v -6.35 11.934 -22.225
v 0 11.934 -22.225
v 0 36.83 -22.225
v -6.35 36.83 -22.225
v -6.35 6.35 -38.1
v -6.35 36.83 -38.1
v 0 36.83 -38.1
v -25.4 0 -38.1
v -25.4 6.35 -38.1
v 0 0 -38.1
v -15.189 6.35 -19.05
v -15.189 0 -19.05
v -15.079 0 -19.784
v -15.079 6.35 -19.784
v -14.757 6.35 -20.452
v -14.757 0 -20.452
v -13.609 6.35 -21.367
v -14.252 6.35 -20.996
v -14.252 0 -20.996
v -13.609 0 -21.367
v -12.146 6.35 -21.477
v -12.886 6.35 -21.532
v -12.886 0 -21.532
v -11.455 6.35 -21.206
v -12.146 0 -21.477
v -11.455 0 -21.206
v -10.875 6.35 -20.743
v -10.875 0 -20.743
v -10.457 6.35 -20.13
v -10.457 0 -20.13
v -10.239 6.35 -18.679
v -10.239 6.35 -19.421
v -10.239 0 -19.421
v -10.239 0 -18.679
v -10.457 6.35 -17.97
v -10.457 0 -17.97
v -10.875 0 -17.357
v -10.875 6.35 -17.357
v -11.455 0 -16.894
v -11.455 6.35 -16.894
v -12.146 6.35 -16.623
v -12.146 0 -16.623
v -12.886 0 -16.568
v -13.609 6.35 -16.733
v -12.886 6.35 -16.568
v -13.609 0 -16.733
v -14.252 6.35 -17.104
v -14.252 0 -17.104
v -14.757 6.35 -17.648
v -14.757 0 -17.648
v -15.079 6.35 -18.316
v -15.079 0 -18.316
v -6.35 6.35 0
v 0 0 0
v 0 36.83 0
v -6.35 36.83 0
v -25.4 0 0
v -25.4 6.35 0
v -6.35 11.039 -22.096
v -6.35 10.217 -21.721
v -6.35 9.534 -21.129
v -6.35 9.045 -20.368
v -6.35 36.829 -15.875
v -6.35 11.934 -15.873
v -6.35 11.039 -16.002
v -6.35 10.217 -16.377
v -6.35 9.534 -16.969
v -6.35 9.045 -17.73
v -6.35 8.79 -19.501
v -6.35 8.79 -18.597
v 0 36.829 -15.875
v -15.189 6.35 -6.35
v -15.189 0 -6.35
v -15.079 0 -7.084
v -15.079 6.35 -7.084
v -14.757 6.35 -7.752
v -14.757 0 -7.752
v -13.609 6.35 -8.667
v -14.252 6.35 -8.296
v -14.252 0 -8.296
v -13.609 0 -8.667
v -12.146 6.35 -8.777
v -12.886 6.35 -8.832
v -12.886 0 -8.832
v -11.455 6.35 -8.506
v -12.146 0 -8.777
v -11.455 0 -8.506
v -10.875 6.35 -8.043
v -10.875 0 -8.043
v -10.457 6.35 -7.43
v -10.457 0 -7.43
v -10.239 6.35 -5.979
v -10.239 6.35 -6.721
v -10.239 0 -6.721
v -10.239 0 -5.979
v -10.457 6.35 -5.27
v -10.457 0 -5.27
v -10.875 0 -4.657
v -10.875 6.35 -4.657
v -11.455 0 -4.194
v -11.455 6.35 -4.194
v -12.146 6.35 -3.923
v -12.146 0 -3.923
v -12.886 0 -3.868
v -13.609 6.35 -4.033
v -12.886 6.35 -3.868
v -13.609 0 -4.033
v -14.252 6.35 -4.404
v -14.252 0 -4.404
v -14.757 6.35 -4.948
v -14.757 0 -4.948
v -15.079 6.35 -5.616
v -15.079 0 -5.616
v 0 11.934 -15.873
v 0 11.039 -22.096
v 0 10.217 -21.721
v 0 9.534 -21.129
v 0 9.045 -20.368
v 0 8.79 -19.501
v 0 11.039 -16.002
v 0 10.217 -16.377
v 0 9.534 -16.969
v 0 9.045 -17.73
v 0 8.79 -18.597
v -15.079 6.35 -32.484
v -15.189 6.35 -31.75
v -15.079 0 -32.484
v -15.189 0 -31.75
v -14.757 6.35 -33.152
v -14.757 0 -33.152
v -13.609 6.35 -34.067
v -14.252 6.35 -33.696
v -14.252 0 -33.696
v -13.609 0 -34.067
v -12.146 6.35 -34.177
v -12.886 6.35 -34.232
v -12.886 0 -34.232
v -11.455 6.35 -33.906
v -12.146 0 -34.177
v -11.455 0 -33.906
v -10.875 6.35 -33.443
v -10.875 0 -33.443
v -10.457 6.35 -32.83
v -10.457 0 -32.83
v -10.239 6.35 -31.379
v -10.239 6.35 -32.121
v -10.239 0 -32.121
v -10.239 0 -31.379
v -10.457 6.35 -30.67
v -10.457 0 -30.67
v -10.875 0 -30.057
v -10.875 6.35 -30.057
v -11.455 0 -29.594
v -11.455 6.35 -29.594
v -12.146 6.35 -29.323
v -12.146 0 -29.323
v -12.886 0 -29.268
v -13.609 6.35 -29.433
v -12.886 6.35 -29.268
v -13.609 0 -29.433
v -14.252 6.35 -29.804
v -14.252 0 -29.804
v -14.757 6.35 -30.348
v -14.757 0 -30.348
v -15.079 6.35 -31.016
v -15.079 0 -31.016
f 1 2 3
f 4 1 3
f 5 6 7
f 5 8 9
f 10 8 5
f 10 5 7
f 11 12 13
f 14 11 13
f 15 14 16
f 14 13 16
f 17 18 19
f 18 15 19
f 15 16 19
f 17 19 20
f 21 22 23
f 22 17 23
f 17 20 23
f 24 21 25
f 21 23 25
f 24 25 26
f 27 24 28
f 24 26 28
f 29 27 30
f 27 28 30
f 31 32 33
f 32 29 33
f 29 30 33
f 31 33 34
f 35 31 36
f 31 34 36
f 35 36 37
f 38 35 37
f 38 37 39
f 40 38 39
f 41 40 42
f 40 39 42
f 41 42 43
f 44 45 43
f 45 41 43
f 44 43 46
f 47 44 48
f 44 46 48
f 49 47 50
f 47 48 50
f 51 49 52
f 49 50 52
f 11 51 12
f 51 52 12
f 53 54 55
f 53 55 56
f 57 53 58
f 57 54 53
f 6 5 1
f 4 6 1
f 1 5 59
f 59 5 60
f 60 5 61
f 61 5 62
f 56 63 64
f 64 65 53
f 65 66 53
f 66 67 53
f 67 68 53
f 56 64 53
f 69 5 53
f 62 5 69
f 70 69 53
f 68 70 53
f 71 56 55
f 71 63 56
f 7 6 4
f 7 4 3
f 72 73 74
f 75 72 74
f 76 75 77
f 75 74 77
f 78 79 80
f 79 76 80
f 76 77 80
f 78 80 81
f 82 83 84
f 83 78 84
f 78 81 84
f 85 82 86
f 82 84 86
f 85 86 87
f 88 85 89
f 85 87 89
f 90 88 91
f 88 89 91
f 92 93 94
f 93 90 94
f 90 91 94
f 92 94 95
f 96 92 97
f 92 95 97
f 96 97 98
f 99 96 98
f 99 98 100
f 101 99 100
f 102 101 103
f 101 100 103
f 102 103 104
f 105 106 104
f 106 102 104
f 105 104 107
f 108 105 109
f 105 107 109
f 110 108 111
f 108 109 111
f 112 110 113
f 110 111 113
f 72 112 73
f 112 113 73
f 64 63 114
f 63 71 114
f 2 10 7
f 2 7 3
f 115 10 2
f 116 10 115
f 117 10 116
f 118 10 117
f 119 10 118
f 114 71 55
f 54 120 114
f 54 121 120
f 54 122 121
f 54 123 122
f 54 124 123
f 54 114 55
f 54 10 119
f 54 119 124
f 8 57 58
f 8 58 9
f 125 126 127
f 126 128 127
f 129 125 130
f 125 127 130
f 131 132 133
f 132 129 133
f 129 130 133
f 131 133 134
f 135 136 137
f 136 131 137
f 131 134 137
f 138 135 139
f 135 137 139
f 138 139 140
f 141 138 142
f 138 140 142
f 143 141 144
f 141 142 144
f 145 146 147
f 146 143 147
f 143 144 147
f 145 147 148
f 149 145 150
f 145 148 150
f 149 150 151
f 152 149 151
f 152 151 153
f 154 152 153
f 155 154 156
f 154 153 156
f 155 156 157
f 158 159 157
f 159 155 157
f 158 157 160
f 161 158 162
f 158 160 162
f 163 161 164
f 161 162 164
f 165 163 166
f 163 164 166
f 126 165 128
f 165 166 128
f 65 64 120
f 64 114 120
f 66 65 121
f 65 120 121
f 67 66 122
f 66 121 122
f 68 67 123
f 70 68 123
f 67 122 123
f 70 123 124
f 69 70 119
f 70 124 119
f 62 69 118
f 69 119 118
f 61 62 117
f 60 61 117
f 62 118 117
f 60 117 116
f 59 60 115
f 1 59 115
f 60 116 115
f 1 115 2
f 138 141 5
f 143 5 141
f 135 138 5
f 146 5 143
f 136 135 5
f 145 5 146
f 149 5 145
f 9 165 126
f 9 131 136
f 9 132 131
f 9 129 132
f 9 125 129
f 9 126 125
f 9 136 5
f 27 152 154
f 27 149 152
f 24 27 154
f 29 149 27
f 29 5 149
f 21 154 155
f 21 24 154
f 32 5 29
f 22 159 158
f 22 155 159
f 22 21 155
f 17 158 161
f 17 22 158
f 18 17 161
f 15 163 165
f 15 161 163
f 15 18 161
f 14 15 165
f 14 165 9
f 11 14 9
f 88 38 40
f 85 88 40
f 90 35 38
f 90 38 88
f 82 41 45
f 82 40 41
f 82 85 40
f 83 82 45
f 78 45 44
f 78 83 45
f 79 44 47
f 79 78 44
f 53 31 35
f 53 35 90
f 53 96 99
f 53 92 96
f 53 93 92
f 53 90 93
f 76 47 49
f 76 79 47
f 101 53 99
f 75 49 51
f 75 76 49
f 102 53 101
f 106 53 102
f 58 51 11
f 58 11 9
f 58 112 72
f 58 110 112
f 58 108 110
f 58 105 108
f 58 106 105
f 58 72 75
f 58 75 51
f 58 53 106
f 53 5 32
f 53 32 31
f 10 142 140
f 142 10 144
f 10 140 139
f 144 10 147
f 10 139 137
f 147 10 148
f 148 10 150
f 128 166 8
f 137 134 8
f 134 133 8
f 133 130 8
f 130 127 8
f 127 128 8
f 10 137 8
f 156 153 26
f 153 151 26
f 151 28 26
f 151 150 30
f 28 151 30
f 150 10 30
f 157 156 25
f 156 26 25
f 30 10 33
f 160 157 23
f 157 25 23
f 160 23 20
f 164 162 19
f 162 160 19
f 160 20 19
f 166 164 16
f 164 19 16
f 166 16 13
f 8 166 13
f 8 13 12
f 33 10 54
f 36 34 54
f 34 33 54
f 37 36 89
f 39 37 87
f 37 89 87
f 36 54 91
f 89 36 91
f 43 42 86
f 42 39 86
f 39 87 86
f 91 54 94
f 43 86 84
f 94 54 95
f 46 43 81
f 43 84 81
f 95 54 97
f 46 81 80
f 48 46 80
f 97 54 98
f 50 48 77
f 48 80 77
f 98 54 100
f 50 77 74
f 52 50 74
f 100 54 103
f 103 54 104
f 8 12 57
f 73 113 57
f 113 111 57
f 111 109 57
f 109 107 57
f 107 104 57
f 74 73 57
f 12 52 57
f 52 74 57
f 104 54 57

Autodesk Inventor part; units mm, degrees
ref_plane "YZ Plane" through (0, 0, 0) normal (1, 0, 0) x (0, 1, 0)
ref_plane "XZ Plane" through (0, 0, 0) normal (0, 1, 0) x (-1, 0, 0)
ref_plane "XY Plane" through (0, 0, 0) normal (0, 0, 1) x (1, 0, 0)
sketch "Sketch1" plane through (0, 0, 0) normal (0, 1, 0) x (-1, 0, 0)
  line L0 (0, 0) -> (25.4, 0)
  line L1 (25.4, 0) -> (25.4, -38.1)
  line L2 (25.4, -38.1) -> (0, -38.1)
  line L3 (0, -38.1) -> (0, 0)
  circle A0 centre (12.7, -6.35) radius 2.4892
  circle A1 centre (12.7, -19.05) radius 2.4892
  circle A2 centre (12.7, -31.75) radius 2.4892
  point P0 (12.7, -38.1)
  dimension "d1" = 38.1
  dimension "d2" = 25.4
  dimension "d3" = 4.9784
  dimension "d4" = 6.35
  dimension "d7" = 12.7
extrude "Extrusion1" add sketch "Sketch1" along normal blind 6.35
sketch "Sketch2" plane through (0, 6.35, 0) normal (0, 1, 0) x (1, 0, 0)
  line L0 (0, 38.1) -> (-25.4, 38.1) projected
  line L1 (0, 38.1) -> (-6.35, 38.1)
  line L2 (-6.35, 38.1) -> (-6.35, 0)
  line L3 (-6.35, 0) -> (0, 0)
  line L4 (0, 0) -> (0, 38.1)
  point P0 (0, 0)
  dimension "d14" = 6.35
  dimension "d15" = 38.1
extrude "Extrusion2" add sketch "Sketch2" along normal blind 30.48
sketch "Sketch3" plane through (0, 0, 0) normal (1, 0, 0) x (0, 0, -1)
  line L0 (0, 6.35) -> (0, 36.83) projected
  line L1 (0, 36.83) -> (15.875, 36.8288)
  line L2 (38.1, 6.35) -> (38.1, 36.83) projected
  line L3 (38.1, 36.83) -> (22.225, 36.83)
  line L4 (38.1, 36.83) -> (0, 36.83) projected
  line L5 (22.225, 36.83) -> (15.8731, 36.83)
  line L6 (15.8731, 36.83) -> (15.8731, 11.9339)
  line L7 (22.225, 11.9339) -> (22.225, 36.83)
  arc A0 (15.8731, 11.9339) -> (22.225, 11.9339) centre (19.049, 11.9339) ccw
  point P0 (0, 0)
  dimension "d18" = 15.875
  dimension "d19" = 15.875
extrude "Extrusion3" cut sketch "Sketch3" against normal blind 30.48
properties part number "BUMPER BRACKETS" material "Aluminum 6061"
